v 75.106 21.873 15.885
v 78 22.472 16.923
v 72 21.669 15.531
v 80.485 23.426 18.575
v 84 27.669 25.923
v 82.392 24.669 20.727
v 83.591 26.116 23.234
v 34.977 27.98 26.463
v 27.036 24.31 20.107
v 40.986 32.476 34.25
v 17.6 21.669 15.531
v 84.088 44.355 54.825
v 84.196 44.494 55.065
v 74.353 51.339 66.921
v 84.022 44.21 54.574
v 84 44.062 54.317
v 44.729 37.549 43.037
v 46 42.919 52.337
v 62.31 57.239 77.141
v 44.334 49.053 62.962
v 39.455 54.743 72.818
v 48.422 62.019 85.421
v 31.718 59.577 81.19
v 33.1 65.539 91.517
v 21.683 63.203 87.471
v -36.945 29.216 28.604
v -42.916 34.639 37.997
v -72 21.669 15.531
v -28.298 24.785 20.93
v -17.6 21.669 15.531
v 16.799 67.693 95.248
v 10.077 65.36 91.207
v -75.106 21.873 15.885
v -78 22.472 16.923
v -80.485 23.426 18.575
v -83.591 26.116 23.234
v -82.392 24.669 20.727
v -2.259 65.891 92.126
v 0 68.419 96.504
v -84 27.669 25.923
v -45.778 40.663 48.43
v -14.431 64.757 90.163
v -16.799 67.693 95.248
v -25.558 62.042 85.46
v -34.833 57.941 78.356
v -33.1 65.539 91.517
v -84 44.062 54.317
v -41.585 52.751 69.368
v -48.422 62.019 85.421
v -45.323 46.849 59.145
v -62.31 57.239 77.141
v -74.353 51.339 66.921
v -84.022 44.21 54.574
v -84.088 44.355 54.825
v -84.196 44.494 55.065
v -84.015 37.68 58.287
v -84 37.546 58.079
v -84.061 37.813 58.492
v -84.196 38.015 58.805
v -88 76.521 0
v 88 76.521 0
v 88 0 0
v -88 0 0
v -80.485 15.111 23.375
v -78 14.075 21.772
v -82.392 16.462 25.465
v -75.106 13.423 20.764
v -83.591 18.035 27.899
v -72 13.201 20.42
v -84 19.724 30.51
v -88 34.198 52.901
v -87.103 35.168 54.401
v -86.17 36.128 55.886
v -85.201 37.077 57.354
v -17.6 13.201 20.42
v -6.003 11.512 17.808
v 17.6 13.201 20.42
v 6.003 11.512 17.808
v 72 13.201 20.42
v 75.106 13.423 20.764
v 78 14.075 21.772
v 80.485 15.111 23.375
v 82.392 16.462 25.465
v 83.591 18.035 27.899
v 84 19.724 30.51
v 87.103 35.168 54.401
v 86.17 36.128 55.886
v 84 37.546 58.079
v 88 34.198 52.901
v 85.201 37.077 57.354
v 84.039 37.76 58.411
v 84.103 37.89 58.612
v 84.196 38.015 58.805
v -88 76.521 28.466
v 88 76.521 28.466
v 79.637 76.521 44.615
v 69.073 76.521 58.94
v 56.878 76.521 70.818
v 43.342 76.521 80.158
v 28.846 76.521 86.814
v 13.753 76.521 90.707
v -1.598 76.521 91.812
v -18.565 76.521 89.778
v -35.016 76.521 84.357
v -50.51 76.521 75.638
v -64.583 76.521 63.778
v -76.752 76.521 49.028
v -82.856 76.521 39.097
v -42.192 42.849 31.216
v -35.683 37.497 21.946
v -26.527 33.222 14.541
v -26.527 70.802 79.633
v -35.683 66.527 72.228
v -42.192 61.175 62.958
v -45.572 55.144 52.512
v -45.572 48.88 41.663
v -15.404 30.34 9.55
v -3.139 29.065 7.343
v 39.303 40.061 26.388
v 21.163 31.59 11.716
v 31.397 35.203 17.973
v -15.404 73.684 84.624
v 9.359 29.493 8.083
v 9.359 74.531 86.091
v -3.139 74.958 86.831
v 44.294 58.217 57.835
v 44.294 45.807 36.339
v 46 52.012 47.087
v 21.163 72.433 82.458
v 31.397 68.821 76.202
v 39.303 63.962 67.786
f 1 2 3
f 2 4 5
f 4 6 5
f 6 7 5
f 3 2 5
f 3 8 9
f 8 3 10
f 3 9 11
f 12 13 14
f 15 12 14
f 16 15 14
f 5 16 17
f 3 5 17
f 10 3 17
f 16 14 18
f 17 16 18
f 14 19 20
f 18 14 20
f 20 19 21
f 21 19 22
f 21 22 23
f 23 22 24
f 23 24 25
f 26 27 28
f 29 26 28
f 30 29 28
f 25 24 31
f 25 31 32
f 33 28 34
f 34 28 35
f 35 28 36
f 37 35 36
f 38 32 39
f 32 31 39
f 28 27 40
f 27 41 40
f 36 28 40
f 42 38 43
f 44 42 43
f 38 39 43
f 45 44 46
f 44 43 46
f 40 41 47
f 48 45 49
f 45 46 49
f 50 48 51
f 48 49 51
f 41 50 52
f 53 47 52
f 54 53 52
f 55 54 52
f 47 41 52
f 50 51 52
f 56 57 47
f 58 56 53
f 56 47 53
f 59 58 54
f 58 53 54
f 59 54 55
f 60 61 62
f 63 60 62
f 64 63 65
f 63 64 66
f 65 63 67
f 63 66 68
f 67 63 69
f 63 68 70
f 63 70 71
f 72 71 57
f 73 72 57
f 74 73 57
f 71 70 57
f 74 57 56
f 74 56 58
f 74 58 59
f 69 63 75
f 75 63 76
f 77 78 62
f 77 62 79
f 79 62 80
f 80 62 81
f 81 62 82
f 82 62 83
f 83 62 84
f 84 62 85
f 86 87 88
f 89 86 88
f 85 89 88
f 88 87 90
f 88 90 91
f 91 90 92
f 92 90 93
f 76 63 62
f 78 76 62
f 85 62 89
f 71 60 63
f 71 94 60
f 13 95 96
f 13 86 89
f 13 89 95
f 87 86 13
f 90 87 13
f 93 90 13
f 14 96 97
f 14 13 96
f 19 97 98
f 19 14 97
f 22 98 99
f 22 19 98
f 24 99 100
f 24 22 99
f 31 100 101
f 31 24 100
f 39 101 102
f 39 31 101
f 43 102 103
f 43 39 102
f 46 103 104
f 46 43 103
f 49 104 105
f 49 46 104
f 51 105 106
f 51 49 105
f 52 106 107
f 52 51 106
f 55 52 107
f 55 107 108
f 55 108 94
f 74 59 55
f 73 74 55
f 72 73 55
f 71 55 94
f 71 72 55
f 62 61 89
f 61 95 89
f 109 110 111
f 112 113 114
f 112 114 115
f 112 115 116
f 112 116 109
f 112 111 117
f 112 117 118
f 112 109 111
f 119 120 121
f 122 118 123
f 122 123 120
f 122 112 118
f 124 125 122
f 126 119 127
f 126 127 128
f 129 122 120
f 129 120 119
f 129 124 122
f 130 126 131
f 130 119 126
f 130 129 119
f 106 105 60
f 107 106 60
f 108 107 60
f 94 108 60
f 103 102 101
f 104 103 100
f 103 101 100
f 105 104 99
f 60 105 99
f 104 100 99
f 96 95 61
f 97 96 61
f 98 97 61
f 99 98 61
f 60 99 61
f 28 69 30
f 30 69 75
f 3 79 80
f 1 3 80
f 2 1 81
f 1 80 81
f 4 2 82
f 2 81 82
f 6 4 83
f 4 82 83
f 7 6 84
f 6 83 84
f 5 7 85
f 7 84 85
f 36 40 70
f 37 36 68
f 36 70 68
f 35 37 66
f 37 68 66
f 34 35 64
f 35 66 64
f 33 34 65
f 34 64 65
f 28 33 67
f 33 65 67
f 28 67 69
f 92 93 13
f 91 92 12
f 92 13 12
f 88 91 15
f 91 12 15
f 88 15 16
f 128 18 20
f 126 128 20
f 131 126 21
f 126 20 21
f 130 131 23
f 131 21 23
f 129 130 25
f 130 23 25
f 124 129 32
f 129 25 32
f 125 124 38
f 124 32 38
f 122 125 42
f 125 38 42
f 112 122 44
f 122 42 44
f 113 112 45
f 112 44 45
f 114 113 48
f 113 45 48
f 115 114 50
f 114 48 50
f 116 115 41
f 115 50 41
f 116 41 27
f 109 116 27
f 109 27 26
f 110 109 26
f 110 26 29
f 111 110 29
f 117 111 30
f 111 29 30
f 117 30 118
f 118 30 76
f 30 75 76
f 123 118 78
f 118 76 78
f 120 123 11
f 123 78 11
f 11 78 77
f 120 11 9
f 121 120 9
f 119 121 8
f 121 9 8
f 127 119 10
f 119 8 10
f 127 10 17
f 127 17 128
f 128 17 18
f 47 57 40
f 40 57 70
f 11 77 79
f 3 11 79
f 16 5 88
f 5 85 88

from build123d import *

# Parameters (mm, degrees)
PAD_DEPTH       = 88
POCKET_DEPTH    = 11
SKETCH011_R     = 46
POCKET001_DEPTH = 10.5
POCKET002_DEPTH = 66.2698164218
POCKET003_DEPTH = 10


with BuildPart() as part:
    # Sketch → Pad (new body, symmetric)
    with BuildSketch(Plane.YZ):
        Polygon((0, 0), (65.2925492254, 100.9999079658), (76.520638, 100.9999079658), (76.520638, 0), align=None)
    extrude(amount=PAD_DEPTH, both=True)

    # Sketch010 (on DatumPlane) → Pocket (cut)
    with BuildSketch(Plane(origin=(0, 54.6423048454, 94.6432482349), x_dir=(1, 0, 0), z_dir=(0, -0.8660254038, 0.5))):
        with BuildLine():
            Line((-84, 85), (-84, -73))
            ThreePointArc((-84, -73), (-80.4852813742, -81.4852813742), (-72, -85))
            Line((-72, -85), (72, -85))
            ThreePointArc((72, -85), (80.4852813742, -81.4852813742), (84, -73))
            Line((84, -73), (84, 85))
            Line((84, 85), (-84, 85))
        make_face()
    extrude(amount=-POCKET_DEPTH, mode=Mode.SUBTRACT)

    # Sketch011 (on Face12 of Pocket) → Pocket001 (cut, symmetric)
    with BuildSketch(Plane(origin=(0, 9.5262794416, -5.5), x_dir=(1, 0, 0), z_dir=(0, -0.8660254038, 0.5))):
        with Locations((0, 66.7846096908)):
            Circle(SKETCH011_R)
    extrude(amount=POCKET001_DEPTH, both=True, mode=Mode.SUBTRACT)

    # Sketch012 (on Face14 of Pocket001) → Pocket002 (cut, through all)
    with BuildSketch(Plane(origin=(0, 0, 0), x_dir=(1, 0, 0), z_dir=(0, -0.8660254038, 0.5))):
        with BuildLine():
            ThreePointArc((97.8966291555, 24.2846096908), (0, 117.7846096908), (-97.8966291555, 24.2846096908))
            Line((-97.8966291555, 154.2846096908), (-97.8966291555, 24.2846096908))
            Line((97.8966291555, 154.2846096908), (-97.8966291555, 154.2846096908))
            Line((97.8966291555, 24.2846096908), (97.8966291555, 154.2846096908))
        make_face()
    extrude(amount=-POCKET002_DEPTH, mode=Mode.SUBTRACT)

    # Sketch016 (on Face14 of Pocket002) → Pocket003 (cut)
    with BuildSketch(Plane(origin=(0, 9.5262794416, -5.5), x_dir=(1, 0, 0), z_dir=(0, -0.8660254038, 0.5))):
        with BuildLine():
            ThreePointArc((88, 69.0708248262), (86, 71.0708248262), (84, 69.0708248262))
            Line((84, 84.0708248262), (84, 69.0708248262))
            Line((88, 84.0708248262), (84, 84.0708248262))
            Line((88, 69.0708248262), (88, 84.0708248262))
        make_face()
        with BuildLine():
            ThreePointArc((-84, 69.0708248262), (-86, 71.0708248262), (-88, 69.0708248262))
            Line((-88, 85.0708248262), (-88, 69.0708248262))
            Line((-84, 85.0708248262), (-88, 85.0708248262))
            Line((-84, 69.0708248262), (-84, 85.0708248262))
        make_face()
    extrude(amount=POCKET003_DEPTH, mode=Mode.SUBTRACT)


solid = part.part
